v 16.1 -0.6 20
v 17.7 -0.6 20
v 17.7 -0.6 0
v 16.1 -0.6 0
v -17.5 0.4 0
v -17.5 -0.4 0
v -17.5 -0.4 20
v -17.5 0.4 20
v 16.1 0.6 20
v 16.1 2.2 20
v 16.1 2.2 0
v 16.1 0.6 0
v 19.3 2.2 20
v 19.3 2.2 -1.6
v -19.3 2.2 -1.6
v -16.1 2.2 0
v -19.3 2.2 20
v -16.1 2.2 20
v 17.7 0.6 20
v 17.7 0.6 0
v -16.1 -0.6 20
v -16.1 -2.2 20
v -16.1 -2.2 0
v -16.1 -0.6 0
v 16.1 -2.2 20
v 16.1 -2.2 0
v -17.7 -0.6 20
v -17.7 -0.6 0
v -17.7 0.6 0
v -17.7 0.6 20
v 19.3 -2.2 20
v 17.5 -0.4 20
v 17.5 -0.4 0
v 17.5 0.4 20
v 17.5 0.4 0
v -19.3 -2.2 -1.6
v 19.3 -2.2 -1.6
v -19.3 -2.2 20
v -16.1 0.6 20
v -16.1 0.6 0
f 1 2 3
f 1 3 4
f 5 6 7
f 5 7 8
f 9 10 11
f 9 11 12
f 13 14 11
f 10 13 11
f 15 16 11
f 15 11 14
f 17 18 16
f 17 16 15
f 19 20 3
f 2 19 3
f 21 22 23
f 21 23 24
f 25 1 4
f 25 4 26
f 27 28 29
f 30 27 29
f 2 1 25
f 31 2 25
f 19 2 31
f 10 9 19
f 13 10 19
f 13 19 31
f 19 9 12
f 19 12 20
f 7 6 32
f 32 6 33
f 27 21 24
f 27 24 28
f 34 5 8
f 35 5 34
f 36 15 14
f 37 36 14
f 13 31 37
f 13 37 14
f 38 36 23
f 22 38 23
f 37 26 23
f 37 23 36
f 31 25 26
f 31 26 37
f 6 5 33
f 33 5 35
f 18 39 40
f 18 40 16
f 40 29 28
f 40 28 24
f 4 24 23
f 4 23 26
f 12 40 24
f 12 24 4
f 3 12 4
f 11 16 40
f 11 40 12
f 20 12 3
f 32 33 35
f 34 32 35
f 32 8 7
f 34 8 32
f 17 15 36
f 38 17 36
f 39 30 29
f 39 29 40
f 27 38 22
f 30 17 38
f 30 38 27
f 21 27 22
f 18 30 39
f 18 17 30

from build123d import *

# Parameters (mm, degrees)
F2_DEPTH = 20
F1_W     = 35
F1_H     = 0.8
F1_W_2   = 32.2
F1_H_2   = 1.6
F3_DEPTH = 1.6
F4_DEPTH = 20


with BuildPart() as f2:
    # F1 (on Top) → F2 (new body)
    with BuildSketch(Plane.XY):
        Polygon((-17.7, -0.6), (-17.7, 0.6), (-16.1, 0.6), (-16.1, 2.2), (-19.3, 2.2), (-19.3, -2.2), (-16.1, -2.2), (-16.1, -0.6), align=None)
    extrude(amount=F2_DEPTH)



with BuildPart() as f2b:
    # F1 (on Top) → F2, piece 2 (new body)
    with BuildSketch(Plane.XY):
        Polygon((16.1, 2.2), (16.1, 0.6), (17.7, 0.6), (17.7, -0.6), (16.1, -0.6), (16.1, -2.2), (19.3, -2.2), (19.3, 2.2), align=None)
    extrude(amount=F2_DEPTH)


with BuildPart() as f2_1:
    add(f2.part)

    add(f2b.part)  # F3 merges F2b
    # F1 (on Top) → F3 (join)
    with BuildSketch(Plane.XY):
        Polygon((-16.1, 0.6), (-17.7, 0.6), (-17.7, -0.6), (-16.1, -0.6), (16.1, -0.6), (17.7, -0.6), (17.7, 0.6), (16.1, 0.6), align=None)
        Rectangle(F1_W, F1_H, mode=Mode.SUBTRACT)
        Rectangle(F1_W, F1_H)
        with Locations((0, 1.4)):
            Rectangle(F1_W_2, F1_H_2)
        with Locations((0, -1.4)):
            Rectangle(F1_W_2, F1_H_2)
        Polygon((-17.7, -0.6), (-17.7, 0.6), (-16.1, 0.6), (-16.1, 2.2), (-19.3, 2.2), (-19.3, -2.2), (-16.1, -2.2), (-16.1, -0.6), align=None)
        Polygon((16.1, 2.2), (16.1, 0.6), (17.7, 0.6), (17.7, -0.6), (16.1, -0.6), (16.1, -2.2), (19.3, -2.2), (19.3, 2.2), align=None)
    extrude(amount=-F3_DEPTH)


with BuildPart() as f4:
    # F1 (on Top) → F4 (new body)
    with BuildSketch(Plane.XY):
        Rectangle(F1_W, F1_H)
    extrude(amount=F4_DEPTH)


solid = Compound([f2_1.part, f4.part])
